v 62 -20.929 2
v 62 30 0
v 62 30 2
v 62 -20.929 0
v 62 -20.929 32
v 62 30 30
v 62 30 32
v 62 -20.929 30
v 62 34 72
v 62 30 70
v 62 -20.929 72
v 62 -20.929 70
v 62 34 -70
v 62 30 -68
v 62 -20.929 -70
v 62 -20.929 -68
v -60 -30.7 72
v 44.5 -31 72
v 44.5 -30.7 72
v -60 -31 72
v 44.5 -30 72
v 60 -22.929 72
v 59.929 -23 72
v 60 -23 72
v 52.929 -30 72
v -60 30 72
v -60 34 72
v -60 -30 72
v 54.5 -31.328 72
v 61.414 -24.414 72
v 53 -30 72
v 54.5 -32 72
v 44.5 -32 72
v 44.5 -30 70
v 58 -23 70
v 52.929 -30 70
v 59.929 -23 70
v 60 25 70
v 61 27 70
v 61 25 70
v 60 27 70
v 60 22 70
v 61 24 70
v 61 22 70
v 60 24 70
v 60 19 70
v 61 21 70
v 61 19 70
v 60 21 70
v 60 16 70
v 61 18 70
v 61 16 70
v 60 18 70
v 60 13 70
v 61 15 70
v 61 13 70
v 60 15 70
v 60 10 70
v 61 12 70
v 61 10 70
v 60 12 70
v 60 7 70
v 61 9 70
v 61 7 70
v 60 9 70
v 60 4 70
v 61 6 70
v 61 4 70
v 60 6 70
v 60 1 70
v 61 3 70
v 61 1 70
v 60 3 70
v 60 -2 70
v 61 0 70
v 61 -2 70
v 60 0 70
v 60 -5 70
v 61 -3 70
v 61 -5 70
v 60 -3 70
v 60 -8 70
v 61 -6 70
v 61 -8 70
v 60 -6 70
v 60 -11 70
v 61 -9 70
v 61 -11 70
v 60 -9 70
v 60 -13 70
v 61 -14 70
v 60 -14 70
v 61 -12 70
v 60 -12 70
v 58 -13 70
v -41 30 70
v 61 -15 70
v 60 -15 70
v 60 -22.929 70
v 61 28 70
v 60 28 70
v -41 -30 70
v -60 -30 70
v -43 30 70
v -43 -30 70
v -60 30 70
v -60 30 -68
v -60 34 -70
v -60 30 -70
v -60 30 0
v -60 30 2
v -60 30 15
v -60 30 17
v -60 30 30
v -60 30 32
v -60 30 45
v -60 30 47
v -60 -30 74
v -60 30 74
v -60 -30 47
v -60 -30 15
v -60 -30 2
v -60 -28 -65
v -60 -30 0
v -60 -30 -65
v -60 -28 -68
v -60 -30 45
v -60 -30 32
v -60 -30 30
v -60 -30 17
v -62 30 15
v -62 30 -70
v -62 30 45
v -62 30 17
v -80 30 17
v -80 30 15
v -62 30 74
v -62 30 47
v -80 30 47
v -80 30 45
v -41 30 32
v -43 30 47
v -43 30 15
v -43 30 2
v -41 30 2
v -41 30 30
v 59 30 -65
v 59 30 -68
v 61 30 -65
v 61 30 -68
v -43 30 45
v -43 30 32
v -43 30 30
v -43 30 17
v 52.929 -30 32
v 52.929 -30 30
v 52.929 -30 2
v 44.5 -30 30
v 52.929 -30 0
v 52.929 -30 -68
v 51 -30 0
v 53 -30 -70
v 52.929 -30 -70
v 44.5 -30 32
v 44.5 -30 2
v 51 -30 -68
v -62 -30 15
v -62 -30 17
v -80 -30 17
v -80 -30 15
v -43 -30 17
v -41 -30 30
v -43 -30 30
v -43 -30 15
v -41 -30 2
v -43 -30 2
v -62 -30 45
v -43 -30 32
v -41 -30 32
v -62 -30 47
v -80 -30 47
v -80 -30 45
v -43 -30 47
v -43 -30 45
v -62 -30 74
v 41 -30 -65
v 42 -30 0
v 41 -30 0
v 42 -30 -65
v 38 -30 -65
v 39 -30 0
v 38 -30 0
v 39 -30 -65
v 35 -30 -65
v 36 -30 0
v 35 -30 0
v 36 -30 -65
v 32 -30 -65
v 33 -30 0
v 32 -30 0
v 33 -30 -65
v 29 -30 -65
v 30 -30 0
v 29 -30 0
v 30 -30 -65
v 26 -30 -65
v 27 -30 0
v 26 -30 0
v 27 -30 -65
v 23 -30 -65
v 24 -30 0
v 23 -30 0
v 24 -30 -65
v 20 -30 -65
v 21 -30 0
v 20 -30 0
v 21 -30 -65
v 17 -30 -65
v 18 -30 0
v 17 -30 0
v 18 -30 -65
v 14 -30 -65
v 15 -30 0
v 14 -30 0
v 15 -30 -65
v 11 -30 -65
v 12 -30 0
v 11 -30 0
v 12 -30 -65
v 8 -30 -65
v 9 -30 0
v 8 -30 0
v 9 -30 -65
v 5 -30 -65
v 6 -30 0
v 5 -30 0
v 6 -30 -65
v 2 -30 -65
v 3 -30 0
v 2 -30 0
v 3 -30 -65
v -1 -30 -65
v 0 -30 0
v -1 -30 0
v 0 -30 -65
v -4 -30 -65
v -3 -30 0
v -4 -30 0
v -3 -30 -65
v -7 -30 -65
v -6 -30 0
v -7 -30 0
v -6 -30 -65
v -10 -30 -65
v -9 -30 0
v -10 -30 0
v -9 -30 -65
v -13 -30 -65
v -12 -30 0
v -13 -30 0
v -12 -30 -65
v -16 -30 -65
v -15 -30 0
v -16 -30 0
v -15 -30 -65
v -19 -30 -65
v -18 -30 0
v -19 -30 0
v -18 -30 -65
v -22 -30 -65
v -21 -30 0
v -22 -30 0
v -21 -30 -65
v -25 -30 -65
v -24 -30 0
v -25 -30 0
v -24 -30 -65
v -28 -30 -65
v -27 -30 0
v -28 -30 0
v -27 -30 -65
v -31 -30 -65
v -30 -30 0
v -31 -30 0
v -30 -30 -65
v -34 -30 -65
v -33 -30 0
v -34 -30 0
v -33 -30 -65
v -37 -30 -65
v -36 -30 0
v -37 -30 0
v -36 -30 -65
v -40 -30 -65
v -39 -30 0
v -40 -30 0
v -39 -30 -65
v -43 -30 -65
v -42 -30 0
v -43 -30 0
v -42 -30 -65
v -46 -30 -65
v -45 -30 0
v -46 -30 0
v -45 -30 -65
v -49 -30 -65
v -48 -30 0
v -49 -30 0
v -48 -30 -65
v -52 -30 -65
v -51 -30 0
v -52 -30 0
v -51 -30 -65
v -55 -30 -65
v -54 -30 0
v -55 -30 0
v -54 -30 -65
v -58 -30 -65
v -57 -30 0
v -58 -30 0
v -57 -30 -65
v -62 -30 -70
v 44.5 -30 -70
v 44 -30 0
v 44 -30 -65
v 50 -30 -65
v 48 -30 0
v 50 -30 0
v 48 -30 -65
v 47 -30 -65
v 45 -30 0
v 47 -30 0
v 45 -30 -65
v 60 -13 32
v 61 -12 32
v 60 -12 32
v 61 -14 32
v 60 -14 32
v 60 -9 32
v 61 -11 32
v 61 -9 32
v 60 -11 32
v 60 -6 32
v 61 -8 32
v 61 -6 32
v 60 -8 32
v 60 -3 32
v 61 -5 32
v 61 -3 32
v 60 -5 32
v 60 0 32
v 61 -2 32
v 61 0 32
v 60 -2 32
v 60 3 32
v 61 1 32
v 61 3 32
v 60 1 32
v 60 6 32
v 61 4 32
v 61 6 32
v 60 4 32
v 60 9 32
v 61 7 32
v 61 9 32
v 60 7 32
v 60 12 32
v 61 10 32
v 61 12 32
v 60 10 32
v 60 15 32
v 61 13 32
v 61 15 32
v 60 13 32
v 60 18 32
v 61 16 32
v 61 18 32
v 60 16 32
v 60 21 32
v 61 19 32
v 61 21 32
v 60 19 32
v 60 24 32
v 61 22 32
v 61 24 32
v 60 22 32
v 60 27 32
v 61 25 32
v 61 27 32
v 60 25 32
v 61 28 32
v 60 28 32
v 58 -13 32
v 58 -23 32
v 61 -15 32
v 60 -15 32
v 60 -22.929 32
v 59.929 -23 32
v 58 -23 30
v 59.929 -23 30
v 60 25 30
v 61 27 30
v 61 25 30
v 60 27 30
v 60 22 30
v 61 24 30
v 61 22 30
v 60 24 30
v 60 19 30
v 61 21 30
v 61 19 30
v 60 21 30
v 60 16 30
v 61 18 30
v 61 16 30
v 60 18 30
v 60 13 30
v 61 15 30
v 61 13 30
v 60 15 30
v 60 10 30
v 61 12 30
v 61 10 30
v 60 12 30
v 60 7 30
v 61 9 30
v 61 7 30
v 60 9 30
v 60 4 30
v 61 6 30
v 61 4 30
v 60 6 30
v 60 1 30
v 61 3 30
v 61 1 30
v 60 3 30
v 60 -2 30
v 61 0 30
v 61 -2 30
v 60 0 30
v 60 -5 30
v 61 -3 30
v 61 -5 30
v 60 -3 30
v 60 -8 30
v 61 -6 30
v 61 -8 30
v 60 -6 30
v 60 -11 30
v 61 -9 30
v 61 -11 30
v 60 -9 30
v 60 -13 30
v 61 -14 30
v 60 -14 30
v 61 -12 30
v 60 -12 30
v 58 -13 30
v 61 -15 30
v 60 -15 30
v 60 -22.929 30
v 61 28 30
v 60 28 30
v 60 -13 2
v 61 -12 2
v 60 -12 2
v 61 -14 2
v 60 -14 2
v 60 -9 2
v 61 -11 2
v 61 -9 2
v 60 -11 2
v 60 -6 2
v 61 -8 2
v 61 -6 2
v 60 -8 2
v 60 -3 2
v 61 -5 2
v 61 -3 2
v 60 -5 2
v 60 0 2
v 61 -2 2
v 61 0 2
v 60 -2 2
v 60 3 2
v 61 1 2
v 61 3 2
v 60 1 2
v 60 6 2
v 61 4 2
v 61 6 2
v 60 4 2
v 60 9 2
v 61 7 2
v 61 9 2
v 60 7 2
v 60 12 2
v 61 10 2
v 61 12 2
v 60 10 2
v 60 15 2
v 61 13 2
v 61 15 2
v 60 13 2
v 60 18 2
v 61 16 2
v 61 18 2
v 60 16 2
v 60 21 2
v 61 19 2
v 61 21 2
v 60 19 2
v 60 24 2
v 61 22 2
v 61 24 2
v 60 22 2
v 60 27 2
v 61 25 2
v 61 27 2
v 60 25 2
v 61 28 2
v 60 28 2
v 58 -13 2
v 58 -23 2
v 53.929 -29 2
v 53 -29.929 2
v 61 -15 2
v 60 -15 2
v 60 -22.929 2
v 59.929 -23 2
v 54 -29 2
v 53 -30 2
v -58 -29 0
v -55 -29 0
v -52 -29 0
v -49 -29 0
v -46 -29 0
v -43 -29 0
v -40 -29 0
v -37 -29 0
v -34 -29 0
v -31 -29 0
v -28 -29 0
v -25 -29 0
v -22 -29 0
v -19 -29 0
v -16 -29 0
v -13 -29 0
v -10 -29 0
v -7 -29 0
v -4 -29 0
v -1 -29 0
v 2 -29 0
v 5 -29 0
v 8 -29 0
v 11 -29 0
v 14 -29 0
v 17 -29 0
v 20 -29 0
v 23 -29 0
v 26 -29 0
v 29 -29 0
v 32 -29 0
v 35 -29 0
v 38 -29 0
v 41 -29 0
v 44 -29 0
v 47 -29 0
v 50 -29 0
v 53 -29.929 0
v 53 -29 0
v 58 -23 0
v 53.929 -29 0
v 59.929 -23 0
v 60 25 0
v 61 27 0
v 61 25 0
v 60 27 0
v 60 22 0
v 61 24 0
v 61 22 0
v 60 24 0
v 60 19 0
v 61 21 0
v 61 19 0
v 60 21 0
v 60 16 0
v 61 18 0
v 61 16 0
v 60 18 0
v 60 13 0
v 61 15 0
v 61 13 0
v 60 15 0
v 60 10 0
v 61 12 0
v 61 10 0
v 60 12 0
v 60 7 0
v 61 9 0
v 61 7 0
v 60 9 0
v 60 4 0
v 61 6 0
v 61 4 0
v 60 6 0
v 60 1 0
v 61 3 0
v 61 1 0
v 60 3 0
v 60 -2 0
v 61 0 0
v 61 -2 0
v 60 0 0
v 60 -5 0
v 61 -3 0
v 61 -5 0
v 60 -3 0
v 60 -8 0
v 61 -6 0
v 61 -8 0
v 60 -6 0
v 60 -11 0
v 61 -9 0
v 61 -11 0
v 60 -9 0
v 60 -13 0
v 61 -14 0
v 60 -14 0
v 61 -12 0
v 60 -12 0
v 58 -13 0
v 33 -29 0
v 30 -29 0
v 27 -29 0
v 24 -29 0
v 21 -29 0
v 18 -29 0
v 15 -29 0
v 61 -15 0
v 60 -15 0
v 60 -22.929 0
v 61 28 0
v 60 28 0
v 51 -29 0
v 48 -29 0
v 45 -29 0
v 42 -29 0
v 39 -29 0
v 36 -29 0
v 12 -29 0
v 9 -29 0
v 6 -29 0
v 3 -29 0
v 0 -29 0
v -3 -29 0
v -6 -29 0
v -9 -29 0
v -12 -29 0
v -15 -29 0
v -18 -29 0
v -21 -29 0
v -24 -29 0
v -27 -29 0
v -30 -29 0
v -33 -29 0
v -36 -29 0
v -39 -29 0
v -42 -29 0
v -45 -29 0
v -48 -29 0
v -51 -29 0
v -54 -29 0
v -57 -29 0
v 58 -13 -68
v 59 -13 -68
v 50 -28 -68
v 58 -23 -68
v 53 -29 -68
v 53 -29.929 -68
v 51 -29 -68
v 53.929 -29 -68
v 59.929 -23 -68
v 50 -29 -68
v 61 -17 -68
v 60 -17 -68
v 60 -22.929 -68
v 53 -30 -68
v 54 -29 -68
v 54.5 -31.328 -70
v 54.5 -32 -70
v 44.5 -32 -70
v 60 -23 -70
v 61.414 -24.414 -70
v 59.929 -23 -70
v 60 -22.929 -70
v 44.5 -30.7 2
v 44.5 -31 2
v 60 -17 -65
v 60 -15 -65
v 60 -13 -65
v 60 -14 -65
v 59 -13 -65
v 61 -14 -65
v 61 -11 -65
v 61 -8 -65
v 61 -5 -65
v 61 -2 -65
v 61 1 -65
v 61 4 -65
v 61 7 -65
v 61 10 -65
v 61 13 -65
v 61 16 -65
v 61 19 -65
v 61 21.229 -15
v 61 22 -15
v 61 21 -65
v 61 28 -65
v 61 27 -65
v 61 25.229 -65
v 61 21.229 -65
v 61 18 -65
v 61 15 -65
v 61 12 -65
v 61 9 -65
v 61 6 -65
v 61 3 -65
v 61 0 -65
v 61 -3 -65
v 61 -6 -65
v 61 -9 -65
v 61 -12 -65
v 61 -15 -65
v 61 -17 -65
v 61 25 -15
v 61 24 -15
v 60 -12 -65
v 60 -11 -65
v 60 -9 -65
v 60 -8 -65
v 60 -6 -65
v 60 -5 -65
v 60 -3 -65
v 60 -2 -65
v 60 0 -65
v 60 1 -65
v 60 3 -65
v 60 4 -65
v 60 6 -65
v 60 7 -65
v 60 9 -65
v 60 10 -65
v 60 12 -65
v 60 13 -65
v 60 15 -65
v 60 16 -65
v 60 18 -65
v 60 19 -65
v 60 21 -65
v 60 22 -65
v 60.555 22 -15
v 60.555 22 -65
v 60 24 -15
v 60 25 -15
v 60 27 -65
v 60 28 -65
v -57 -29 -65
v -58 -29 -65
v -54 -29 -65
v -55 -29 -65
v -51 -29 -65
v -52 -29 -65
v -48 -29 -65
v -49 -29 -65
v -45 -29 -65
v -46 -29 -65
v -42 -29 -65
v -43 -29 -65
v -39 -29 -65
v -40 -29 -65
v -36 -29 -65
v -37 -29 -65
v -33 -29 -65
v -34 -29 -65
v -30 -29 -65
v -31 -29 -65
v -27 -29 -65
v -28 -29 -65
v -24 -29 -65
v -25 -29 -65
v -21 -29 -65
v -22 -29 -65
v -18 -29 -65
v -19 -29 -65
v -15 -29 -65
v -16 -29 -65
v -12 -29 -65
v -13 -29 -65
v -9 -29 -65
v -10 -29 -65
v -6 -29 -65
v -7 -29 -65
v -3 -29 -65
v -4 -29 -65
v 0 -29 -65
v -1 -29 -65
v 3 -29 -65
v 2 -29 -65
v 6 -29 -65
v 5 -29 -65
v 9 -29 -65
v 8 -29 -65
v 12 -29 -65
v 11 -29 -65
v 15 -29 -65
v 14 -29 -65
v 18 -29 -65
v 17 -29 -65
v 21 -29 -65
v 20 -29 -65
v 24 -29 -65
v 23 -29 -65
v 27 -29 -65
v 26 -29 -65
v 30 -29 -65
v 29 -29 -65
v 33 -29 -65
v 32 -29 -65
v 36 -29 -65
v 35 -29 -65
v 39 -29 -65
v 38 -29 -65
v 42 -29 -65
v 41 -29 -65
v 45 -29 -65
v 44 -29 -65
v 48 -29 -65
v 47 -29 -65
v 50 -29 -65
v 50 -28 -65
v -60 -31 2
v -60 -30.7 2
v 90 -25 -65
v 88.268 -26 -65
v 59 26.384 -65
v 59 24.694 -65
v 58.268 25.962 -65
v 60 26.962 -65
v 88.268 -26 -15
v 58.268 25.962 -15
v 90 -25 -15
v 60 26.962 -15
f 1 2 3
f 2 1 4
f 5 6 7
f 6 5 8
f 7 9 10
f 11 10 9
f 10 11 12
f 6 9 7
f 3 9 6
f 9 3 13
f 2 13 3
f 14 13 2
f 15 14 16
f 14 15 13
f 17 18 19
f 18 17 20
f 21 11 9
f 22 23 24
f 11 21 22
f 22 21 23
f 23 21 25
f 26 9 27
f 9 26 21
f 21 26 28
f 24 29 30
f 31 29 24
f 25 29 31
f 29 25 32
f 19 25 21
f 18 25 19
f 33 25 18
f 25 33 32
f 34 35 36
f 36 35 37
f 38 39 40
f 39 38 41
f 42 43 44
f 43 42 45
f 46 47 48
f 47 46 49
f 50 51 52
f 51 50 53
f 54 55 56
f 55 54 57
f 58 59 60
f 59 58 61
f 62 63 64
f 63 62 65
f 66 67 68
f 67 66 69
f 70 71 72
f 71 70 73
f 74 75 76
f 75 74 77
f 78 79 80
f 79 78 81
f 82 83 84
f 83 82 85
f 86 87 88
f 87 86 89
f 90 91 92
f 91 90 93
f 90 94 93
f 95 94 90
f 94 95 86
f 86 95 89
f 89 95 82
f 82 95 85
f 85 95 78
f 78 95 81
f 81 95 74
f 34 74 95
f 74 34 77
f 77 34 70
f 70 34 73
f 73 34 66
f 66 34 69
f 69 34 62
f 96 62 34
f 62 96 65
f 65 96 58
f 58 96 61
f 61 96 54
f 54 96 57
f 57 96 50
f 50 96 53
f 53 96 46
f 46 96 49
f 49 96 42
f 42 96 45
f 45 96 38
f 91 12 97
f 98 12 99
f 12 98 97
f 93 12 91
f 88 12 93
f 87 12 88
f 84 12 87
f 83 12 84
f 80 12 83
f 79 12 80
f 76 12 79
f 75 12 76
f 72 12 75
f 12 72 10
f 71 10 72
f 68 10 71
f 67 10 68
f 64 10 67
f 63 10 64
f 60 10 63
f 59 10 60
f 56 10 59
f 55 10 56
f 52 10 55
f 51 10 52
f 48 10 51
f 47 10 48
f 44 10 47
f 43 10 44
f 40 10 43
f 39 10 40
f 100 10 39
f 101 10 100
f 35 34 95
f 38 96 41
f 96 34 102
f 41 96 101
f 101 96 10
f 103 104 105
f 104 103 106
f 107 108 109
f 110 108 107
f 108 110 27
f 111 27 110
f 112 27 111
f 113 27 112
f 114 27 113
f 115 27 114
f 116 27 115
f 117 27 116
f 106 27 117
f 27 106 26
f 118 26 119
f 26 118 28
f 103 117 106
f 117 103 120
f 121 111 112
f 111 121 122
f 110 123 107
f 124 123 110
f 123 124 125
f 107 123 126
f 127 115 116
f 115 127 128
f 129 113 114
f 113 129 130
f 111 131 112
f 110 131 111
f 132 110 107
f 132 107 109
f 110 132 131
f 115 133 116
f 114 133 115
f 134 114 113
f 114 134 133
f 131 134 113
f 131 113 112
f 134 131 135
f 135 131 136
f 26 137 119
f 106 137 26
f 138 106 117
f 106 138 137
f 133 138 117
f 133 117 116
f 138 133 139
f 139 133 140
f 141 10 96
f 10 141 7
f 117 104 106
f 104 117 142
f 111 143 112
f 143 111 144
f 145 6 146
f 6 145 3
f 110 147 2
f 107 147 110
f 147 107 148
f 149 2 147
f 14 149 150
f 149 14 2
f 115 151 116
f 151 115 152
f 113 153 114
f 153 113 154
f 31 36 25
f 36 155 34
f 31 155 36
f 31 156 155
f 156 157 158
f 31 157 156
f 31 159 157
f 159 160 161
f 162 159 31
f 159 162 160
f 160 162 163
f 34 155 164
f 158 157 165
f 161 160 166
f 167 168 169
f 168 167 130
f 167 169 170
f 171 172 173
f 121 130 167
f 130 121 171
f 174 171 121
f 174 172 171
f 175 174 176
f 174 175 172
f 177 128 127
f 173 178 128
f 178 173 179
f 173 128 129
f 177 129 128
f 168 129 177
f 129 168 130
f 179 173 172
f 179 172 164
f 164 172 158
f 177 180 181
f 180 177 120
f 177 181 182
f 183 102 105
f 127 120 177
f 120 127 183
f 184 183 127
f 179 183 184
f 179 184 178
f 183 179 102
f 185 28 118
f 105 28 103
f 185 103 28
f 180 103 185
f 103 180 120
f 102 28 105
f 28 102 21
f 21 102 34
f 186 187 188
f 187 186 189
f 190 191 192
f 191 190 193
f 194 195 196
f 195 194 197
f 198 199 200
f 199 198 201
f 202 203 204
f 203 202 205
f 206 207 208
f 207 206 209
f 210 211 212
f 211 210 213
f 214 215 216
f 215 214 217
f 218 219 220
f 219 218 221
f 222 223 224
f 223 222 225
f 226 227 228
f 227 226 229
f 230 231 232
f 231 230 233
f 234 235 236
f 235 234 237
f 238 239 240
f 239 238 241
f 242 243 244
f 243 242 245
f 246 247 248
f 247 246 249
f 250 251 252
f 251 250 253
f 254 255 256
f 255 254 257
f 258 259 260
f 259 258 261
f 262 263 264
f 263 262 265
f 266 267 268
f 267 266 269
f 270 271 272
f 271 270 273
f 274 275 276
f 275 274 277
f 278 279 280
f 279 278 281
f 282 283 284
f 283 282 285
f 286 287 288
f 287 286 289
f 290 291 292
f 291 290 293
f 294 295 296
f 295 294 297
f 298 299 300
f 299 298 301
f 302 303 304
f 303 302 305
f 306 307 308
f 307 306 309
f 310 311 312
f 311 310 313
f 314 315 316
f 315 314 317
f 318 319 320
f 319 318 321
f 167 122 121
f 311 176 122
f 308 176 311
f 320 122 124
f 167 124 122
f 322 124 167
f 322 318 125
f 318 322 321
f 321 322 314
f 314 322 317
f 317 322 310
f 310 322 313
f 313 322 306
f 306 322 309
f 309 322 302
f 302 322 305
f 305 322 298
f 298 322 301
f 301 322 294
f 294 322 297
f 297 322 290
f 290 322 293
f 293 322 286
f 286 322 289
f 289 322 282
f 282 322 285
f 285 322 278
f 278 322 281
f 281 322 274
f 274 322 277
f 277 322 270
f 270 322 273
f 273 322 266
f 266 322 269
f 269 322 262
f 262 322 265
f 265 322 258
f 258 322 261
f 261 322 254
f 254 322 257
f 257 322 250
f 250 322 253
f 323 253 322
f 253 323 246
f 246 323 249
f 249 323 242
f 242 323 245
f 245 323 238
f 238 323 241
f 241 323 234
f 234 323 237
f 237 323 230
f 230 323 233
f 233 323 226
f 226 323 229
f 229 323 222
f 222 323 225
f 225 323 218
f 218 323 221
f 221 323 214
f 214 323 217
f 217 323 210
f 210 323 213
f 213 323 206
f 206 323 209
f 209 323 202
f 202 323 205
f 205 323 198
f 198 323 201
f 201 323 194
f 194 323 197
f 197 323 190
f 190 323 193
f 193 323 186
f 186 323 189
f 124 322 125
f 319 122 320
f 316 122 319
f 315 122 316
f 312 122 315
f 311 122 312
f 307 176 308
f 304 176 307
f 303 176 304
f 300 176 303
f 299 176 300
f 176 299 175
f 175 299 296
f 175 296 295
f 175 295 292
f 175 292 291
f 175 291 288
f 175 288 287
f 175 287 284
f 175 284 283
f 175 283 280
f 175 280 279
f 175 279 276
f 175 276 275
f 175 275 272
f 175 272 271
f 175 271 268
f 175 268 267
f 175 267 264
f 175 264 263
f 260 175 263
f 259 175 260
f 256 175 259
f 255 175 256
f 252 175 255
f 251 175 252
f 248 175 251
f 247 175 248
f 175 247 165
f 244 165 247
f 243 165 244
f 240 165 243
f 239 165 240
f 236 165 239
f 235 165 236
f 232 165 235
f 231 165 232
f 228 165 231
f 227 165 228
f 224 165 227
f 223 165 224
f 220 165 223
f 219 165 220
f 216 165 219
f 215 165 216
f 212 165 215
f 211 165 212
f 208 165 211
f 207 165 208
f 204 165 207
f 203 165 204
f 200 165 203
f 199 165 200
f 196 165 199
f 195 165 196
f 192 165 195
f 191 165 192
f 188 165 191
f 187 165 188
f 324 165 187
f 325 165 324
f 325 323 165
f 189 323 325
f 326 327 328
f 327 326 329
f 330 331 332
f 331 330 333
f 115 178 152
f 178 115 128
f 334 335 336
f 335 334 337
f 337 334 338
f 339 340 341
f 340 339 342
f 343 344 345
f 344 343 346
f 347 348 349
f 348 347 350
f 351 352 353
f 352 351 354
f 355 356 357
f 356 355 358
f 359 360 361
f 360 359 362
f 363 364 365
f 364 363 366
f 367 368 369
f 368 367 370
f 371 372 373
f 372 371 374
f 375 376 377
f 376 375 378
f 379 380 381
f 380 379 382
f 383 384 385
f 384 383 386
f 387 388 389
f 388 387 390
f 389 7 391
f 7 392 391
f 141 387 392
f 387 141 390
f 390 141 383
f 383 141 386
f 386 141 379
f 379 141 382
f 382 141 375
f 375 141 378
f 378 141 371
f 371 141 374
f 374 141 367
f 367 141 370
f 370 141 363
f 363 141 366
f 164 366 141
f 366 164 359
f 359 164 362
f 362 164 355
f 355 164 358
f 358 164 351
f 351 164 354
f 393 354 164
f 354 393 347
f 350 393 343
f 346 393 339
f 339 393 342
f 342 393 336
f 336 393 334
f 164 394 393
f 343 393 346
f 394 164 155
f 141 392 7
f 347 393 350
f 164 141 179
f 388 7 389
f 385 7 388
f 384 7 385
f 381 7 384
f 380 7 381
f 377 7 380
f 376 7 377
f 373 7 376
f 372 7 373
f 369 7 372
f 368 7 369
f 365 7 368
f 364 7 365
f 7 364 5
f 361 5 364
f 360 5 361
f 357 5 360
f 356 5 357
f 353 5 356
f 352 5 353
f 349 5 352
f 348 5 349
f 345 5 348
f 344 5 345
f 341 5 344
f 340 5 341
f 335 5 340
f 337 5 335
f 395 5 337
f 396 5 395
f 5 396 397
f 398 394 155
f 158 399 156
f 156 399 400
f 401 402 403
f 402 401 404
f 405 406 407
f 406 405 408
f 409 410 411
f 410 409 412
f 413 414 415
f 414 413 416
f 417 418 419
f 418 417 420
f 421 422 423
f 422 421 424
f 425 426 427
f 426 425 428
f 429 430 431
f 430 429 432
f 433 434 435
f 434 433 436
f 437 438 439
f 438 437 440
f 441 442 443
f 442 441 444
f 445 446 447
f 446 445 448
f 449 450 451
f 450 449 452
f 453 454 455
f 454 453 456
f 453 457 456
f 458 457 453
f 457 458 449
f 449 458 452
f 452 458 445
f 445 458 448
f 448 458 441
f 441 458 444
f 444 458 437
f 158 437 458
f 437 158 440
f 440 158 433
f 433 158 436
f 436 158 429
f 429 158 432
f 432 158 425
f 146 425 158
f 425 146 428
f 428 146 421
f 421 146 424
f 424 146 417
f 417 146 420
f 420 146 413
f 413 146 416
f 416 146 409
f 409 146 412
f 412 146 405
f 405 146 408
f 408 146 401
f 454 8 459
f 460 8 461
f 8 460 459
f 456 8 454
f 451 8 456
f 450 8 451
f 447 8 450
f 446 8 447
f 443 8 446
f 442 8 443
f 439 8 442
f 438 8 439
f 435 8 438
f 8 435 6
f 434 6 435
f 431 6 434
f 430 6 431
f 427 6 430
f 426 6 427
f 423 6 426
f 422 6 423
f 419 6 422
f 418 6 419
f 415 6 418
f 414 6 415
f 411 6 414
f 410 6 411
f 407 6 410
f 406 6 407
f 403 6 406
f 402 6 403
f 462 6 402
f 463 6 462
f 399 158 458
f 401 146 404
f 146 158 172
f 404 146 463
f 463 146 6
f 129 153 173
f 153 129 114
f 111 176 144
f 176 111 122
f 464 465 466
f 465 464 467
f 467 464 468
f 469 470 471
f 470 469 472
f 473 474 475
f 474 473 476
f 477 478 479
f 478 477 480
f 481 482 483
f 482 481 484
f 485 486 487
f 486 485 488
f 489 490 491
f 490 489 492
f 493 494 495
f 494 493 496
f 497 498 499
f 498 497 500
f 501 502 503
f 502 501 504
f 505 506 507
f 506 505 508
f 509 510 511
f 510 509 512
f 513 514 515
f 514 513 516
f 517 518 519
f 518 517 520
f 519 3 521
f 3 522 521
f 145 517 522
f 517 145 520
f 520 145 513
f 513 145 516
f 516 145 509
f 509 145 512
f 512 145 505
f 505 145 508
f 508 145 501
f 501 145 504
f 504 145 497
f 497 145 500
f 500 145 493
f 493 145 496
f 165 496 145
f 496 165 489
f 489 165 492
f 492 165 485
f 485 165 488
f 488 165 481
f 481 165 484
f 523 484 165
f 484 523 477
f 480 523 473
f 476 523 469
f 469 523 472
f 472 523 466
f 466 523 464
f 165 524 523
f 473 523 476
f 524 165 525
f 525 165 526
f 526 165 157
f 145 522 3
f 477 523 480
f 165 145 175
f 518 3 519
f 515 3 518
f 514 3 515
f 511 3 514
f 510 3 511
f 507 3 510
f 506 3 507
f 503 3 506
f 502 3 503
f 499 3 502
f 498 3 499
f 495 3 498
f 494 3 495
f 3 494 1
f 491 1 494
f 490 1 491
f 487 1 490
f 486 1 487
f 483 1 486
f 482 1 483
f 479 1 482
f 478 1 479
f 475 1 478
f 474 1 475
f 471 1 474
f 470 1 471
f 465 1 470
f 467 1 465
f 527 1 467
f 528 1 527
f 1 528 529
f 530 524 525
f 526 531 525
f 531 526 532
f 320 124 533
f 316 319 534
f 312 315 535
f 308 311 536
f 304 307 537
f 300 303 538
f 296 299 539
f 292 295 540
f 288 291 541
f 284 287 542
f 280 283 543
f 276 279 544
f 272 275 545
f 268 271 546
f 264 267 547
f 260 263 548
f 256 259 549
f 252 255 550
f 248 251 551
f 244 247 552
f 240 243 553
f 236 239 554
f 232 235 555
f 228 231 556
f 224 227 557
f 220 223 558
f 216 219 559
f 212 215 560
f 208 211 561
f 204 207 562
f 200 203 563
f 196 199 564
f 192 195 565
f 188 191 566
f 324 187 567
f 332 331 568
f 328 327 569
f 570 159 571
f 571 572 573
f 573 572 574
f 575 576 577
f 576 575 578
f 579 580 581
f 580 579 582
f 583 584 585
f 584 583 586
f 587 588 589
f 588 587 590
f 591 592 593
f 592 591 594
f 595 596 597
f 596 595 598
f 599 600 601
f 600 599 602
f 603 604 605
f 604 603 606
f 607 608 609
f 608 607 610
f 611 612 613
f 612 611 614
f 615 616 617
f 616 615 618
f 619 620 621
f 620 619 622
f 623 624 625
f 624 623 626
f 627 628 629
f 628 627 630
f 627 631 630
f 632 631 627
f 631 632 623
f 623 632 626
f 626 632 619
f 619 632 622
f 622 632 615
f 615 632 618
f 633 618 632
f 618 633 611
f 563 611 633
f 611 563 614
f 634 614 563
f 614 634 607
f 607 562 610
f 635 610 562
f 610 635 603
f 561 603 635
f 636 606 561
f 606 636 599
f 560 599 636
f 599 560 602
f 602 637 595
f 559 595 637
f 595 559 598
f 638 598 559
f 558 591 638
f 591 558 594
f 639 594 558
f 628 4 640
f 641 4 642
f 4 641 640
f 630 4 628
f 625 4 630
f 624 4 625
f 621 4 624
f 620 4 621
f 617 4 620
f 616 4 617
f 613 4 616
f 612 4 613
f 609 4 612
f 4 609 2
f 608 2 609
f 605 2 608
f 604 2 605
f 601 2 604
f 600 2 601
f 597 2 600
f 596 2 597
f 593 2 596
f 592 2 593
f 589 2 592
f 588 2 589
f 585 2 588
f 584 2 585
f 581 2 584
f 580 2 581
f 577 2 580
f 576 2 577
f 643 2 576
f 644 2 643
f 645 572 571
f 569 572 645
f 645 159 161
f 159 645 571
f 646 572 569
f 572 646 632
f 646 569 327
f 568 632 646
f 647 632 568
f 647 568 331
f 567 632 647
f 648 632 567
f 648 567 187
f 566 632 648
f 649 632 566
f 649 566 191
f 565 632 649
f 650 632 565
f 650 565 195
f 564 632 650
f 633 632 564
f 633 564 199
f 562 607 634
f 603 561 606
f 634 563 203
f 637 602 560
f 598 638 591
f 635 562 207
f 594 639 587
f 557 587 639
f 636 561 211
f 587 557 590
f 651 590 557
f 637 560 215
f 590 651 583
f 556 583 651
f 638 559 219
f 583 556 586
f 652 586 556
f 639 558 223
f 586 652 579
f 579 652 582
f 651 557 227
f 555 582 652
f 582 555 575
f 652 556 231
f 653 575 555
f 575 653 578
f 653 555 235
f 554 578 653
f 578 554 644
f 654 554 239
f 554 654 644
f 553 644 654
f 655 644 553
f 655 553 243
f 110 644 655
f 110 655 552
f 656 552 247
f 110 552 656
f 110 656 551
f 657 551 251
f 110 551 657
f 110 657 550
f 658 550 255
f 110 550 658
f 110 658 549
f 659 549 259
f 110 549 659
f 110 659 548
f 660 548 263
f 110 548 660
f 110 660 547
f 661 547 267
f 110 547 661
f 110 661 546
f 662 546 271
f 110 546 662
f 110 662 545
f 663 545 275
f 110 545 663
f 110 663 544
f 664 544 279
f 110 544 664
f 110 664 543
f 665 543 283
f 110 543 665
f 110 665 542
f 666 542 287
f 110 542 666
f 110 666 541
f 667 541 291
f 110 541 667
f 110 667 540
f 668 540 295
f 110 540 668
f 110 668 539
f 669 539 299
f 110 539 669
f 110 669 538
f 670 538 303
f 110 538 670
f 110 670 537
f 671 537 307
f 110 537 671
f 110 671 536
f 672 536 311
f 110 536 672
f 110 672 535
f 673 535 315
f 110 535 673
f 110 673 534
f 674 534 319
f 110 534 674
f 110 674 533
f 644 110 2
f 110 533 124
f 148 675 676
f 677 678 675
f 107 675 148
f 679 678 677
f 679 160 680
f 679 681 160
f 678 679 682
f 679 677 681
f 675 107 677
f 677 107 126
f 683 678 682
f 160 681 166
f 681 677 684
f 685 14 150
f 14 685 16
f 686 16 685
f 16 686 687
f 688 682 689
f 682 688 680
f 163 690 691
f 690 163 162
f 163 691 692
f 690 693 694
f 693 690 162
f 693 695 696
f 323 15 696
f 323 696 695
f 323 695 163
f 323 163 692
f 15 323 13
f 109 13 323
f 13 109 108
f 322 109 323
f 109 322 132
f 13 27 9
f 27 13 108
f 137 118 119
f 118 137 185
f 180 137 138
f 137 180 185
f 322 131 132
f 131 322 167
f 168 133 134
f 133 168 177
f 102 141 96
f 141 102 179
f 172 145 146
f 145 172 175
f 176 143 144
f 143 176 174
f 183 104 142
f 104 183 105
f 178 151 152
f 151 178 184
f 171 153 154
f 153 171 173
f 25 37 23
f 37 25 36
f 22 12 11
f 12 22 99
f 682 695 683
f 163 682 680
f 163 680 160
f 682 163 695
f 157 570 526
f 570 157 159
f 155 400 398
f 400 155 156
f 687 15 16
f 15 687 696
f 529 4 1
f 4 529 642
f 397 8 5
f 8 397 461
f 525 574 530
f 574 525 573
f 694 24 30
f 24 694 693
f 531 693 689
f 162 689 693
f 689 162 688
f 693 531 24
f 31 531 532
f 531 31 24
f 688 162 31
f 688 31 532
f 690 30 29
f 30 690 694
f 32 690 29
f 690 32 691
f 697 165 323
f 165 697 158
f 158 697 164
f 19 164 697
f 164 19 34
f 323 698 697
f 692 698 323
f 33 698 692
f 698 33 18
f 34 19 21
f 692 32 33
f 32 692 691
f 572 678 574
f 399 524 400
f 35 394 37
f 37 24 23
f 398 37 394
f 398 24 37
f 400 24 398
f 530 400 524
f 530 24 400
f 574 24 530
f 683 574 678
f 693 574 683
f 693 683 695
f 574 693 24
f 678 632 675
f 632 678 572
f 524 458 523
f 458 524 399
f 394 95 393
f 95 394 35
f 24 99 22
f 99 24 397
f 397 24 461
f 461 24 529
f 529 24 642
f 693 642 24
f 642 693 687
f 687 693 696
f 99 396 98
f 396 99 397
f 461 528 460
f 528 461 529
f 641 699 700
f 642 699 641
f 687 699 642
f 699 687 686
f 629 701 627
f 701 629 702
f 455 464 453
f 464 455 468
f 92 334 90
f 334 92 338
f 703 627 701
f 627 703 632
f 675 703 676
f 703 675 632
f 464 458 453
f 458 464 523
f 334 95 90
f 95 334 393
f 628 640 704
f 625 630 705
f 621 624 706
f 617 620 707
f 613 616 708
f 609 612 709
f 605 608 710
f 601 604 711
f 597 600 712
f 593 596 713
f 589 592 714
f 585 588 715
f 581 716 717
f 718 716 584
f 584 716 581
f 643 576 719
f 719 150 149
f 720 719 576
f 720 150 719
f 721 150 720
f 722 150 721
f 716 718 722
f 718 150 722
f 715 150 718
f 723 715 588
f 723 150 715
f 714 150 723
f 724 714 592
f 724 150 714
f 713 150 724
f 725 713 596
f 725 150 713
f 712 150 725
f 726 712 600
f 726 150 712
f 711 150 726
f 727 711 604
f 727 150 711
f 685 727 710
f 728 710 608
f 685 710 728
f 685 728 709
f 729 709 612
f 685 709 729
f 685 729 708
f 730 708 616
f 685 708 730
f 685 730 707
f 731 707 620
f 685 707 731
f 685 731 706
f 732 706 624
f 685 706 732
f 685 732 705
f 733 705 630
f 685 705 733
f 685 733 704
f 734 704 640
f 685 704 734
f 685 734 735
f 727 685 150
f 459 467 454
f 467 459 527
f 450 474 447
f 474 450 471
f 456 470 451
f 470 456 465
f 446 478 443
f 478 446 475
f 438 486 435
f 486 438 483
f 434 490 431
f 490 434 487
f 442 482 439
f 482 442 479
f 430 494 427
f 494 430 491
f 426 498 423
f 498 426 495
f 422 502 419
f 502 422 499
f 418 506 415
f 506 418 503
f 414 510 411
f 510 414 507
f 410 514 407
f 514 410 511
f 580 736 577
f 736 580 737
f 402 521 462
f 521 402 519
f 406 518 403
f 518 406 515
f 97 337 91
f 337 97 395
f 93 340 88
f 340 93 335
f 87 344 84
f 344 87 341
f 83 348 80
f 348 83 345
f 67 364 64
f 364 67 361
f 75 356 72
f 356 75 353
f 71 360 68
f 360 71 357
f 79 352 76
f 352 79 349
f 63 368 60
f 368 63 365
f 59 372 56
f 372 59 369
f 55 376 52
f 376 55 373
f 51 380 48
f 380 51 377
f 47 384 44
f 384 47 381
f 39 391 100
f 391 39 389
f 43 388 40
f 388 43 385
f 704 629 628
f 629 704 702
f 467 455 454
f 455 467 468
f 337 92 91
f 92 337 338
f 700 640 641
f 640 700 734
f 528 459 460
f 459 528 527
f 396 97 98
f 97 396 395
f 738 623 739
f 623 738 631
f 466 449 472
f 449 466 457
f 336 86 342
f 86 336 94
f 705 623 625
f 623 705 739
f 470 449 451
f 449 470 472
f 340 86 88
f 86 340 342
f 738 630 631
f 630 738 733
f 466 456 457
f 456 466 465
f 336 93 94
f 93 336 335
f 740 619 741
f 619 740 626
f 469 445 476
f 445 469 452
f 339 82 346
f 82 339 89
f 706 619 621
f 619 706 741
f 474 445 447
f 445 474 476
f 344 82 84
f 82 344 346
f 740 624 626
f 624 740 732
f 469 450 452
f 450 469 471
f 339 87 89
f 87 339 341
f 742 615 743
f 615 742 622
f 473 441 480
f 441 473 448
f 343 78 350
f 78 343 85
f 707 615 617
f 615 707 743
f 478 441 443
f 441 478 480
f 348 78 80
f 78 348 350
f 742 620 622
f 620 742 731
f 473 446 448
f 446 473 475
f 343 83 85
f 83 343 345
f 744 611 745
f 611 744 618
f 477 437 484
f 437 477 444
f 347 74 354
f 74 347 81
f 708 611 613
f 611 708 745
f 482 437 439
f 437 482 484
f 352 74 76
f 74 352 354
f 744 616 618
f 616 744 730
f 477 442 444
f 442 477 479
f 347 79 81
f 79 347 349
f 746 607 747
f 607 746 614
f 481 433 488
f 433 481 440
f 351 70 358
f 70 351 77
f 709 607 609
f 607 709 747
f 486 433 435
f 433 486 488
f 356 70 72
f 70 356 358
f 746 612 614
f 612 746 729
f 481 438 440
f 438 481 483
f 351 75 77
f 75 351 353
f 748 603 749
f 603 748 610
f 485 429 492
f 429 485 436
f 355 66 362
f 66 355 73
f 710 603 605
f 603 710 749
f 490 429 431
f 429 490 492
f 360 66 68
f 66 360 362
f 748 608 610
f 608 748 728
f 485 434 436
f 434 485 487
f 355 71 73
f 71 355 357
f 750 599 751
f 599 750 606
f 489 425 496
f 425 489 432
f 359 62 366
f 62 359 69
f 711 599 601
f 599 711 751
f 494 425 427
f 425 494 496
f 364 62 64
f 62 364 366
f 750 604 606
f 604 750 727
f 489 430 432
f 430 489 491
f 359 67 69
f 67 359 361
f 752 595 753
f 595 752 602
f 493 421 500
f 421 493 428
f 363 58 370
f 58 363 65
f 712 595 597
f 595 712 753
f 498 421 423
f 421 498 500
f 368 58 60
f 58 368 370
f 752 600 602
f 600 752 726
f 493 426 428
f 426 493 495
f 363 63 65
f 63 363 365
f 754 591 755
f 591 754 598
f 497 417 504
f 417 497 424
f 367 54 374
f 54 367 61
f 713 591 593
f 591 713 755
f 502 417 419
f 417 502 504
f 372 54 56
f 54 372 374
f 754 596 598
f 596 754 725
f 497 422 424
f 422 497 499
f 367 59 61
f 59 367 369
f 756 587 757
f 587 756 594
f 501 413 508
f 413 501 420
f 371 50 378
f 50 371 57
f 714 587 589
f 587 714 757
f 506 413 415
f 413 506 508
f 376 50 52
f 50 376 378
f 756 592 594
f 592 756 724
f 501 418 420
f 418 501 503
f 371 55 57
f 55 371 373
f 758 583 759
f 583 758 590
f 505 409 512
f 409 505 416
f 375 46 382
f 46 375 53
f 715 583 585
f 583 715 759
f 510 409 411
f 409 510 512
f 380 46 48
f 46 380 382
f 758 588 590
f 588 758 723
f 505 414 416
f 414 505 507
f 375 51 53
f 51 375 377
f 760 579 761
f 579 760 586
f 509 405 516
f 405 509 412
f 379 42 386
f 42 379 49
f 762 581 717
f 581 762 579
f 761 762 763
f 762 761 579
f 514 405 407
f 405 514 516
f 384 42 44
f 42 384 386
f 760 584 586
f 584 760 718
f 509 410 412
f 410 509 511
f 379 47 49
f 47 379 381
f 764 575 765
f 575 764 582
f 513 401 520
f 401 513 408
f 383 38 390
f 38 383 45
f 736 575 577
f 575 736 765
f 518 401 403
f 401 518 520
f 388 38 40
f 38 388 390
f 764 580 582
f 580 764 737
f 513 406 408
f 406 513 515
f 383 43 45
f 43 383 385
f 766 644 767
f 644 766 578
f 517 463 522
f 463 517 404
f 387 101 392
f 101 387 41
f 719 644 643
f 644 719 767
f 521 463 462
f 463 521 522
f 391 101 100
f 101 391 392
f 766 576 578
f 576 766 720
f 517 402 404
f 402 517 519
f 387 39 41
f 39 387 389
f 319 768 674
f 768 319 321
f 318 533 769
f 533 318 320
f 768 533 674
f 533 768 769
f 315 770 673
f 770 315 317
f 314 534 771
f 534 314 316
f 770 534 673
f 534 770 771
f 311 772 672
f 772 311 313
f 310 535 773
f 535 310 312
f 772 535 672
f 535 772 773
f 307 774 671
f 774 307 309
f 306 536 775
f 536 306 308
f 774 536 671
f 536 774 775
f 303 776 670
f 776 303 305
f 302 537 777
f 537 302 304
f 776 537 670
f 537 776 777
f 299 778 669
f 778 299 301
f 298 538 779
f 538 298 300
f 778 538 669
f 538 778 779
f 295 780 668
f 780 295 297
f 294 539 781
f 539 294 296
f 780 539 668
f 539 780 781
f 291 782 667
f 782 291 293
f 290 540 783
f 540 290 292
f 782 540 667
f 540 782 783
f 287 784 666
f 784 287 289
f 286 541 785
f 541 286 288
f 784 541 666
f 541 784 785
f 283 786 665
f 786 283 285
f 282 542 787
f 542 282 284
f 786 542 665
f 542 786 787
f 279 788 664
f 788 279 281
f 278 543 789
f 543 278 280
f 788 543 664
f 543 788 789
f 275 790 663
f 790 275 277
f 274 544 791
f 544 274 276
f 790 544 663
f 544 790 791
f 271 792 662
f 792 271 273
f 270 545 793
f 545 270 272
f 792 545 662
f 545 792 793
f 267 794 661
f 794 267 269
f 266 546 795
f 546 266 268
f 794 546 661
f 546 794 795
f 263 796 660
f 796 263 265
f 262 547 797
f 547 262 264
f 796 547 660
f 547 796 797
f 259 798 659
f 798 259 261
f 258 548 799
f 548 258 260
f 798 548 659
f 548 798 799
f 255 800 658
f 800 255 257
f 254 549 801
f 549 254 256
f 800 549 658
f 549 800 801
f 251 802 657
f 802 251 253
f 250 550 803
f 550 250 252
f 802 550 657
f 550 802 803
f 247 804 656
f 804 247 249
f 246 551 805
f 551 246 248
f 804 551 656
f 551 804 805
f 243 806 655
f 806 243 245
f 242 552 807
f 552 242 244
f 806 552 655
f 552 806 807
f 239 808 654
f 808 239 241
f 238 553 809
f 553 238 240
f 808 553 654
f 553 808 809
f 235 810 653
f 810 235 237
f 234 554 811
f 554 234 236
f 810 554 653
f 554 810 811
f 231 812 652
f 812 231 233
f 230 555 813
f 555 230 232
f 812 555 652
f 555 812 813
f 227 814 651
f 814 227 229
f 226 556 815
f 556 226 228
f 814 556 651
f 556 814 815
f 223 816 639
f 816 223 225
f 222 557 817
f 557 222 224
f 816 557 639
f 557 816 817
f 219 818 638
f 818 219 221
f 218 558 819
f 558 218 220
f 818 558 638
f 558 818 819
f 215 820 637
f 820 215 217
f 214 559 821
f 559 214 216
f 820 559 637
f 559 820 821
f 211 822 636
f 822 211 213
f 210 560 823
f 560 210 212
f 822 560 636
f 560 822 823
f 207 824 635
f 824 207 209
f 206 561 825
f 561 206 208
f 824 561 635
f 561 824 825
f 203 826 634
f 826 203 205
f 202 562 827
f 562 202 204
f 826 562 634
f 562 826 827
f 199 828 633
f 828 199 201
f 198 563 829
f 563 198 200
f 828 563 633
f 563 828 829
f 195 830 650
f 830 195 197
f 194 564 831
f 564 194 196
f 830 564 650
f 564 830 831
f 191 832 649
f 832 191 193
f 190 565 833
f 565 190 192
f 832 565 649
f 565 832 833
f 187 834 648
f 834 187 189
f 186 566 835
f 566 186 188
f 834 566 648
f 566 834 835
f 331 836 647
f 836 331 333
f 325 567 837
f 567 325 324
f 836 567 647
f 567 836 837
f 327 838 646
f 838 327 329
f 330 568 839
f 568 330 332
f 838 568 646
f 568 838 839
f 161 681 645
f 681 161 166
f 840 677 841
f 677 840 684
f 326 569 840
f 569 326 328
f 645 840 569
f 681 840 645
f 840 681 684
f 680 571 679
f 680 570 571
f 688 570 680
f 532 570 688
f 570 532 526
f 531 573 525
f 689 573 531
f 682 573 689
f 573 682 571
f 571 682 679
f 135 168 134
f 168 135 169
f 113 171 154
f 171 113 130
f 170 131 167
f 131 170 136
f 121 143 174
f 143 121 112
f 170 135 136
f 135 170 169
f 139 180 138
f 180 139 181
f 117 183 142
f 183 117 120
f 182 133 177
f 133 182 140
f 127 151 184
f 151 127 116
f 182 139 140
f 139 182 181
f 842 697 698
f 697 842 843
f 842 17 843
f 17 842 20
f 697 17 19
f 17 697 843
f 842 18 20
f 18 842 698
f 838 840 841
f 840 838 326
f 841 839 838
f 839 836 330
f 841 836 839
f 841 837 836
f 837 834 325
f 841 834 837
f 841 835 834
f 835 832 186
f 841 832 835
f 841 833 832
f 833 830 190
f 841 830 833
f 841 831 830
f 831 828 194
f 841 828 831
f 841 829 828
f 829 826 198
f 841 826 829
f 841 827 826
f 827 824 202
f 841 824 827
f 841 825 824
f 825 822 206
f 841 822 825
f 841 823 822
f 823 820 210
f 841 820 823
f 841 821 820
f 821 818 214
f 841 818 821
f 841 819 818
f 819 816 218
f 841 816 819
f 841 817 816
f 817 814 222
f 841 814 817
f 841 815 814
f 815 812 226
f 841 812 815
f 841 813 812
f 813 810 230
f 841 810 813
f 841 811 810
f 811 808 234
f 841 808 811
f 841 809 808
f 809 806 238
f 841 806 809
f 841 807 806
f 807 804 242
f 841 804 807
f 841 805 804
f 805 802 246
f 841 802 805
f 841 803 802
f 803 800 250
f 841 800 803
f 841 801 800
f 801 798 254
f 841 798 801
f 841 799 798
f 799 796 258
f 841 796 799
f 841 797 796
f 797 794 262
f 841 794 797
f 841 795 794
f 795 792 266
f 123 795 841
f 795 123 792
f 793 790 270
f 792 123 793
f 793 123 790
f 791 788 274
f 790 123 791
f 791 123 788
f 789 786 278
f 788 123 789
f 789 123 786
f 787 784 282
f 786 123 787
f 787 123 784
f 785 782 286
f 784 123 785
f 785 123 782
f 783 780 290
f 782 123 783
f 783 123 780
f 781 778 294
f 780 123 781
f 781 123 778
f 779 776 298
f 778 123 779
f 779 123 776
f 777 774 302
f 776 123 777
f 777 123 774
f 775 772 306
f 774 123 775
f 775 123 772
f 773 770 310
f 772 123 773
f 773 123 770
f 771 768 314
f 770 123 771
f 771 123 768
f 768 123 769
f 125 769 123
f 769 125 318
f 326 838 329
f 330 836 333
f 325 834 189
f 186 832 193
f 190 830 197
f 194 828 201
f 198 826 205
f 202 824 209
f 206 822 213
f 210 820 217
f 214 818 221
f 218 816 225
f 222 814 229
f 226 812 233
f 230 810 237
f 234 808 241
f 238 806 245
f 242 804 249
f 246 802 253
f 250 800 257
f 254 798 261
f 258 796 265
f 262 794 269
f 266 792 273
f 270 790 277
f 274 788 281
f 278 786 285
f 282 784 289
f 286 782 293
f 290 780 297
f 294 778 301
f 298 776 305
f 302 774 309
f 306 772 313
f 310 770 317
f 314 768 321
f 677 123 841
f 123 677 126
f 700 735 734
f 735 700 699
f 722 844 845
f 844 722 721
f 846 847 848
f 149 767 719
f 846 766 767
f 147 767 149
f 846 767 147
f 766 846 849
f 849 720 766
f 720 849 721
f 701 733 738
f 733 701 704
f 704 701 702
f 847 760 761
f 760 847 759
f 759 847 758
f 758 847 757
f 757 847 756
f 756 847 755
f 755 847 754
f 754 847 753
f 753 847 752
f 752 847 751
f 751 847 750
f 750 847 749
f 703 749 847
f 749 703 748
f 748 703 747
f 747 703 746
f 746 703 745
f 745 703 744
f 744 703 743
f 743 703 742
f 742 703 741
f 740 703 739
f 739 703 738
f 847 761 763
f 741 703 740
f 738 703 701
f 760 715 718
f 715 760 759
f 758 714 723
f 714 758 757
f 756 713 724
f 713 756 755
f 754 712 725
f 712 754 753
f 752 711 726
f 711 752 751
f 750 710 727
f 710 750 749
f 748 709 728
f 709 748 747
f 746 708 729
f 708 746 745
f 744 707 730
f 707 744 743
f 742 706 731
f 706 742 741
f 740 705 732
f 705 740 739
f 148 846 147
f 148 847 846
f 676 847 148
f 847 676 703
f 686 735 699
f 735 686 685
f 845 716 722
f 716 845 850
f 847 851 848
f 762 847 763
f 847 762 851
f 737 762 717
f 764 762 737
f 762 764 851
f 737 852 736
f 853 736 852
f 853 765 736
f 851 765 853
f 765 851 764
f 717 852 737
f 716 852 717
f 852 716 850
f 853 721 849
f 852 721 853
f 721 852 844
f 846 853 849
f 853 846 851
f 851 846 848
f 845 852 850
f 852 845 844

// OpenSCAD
difference(){
    //--estructura principal
union() {
    //--techo
 translate ([-60,-30,70])
    cube ([122,60,2 ]);
    //--repisa 3 piso
    translate ([-60,-30,30])
    cube ([122,60, 2]);
     //--REPISA DE LA MITAD 2 PISO
   translate ([-60,-30,0])
    cube ([122,60, 2]);
    //--repiisa inferior
translate ([-60,-30,-70])
      cube ([122,60,2 ]);
    //-- pared trasera
  translate ([-60,30,-70])
    color("orange")
    cube ([122,4,142]);
    //-- pared lado  izquierdo
      translate ([-62,-30,-70])
    color("orange")
    cube ([2,60,144]);
    //-- 2 pared  lado  izquierdo  mas  derecho de bajo
    translate ([-43,-30,2])
    color("orange")
    cube ([2,60,68])
        //-- 2 pared  lado  izquierdo  mas  derecho de arriba
    translate ([-62,-30,30])
    color("orange")
    cube ([2,60,30]);
}
//--desparision de una esquina
translate([60,-30,-72])
rotate([0,0,75])
    cylinder (r =20/2  , h =144,$fn=3);
}
//--pilar de  lado derecho
module modulopilar() {
 color("orange")
translate([60,-23,-70])
rotate([0,0,225])
   cube ([10,2,142]);
translate([44.5,-32,-70])
     color("orange")
cube ([10,2,142]);
translate([60,-23,-70])
rotate([0,0,90])
     color("orange")
   cube ([10,2,142]); 
    }
    modulopilar();
            //-- repisa 2
    translate ([-80,-30,15])
    cube ([38,60,2]);
    //-- repisa  4
    translate ([-80,-30,45])
    cube ([38,60,2]);
    module reja() {
        for (i=[0:veces]){
        color("gray"){
        translate ([cordenada_x,cordenada_y,cordenada_z])
            translate([i*iy,i*ix,0])
      rotate ([rotaciongradox,rotaciongradoy,0]){
        cube([1,1,altura]);

          }}}}
    //--reja 
  reja(altura= 140,cordenada_x=60,cordenada_y=-15,cordenada_z=-68,veces=14,rotaciongradoy=0,rotaciongradox=0,iy=0,ix=3);
   //--reja galoineritomini
  reja(altura= 70,cordenada_x=-58,cordenada_y=-30,cordenada_z=-68,veces=37,rotaciongradoy=-0,rotaciongradox=0,iy=3,ix=0);
        //--acrilico incubadora y nacedora
          translate([-60,-31,2]){
              color("black",0.7)
           cube ([112,0.3,70]);
          }
          //--retoques
          //--poner el aserrin  abjo desplegar
          //-- frontal
 translate([-60,-30,-70]){
           cube ([110,2,5]);
          }
         //-- lado 
          translate([59,-17,-70]){
           cube ([2,50,5]);
          }
          //--puerta
         distanciadelapuerta =90;//87 para habrir y 63 para cerrar
                        zrotar=30;
            translate([distanciadelapuerta,-25,-65]){
          mirror(){
          rotate([0,0,-zrotar]){//rotar 30 para habrir 0 para cerrar
           cube ([2,60,50]);
          }}}
          
